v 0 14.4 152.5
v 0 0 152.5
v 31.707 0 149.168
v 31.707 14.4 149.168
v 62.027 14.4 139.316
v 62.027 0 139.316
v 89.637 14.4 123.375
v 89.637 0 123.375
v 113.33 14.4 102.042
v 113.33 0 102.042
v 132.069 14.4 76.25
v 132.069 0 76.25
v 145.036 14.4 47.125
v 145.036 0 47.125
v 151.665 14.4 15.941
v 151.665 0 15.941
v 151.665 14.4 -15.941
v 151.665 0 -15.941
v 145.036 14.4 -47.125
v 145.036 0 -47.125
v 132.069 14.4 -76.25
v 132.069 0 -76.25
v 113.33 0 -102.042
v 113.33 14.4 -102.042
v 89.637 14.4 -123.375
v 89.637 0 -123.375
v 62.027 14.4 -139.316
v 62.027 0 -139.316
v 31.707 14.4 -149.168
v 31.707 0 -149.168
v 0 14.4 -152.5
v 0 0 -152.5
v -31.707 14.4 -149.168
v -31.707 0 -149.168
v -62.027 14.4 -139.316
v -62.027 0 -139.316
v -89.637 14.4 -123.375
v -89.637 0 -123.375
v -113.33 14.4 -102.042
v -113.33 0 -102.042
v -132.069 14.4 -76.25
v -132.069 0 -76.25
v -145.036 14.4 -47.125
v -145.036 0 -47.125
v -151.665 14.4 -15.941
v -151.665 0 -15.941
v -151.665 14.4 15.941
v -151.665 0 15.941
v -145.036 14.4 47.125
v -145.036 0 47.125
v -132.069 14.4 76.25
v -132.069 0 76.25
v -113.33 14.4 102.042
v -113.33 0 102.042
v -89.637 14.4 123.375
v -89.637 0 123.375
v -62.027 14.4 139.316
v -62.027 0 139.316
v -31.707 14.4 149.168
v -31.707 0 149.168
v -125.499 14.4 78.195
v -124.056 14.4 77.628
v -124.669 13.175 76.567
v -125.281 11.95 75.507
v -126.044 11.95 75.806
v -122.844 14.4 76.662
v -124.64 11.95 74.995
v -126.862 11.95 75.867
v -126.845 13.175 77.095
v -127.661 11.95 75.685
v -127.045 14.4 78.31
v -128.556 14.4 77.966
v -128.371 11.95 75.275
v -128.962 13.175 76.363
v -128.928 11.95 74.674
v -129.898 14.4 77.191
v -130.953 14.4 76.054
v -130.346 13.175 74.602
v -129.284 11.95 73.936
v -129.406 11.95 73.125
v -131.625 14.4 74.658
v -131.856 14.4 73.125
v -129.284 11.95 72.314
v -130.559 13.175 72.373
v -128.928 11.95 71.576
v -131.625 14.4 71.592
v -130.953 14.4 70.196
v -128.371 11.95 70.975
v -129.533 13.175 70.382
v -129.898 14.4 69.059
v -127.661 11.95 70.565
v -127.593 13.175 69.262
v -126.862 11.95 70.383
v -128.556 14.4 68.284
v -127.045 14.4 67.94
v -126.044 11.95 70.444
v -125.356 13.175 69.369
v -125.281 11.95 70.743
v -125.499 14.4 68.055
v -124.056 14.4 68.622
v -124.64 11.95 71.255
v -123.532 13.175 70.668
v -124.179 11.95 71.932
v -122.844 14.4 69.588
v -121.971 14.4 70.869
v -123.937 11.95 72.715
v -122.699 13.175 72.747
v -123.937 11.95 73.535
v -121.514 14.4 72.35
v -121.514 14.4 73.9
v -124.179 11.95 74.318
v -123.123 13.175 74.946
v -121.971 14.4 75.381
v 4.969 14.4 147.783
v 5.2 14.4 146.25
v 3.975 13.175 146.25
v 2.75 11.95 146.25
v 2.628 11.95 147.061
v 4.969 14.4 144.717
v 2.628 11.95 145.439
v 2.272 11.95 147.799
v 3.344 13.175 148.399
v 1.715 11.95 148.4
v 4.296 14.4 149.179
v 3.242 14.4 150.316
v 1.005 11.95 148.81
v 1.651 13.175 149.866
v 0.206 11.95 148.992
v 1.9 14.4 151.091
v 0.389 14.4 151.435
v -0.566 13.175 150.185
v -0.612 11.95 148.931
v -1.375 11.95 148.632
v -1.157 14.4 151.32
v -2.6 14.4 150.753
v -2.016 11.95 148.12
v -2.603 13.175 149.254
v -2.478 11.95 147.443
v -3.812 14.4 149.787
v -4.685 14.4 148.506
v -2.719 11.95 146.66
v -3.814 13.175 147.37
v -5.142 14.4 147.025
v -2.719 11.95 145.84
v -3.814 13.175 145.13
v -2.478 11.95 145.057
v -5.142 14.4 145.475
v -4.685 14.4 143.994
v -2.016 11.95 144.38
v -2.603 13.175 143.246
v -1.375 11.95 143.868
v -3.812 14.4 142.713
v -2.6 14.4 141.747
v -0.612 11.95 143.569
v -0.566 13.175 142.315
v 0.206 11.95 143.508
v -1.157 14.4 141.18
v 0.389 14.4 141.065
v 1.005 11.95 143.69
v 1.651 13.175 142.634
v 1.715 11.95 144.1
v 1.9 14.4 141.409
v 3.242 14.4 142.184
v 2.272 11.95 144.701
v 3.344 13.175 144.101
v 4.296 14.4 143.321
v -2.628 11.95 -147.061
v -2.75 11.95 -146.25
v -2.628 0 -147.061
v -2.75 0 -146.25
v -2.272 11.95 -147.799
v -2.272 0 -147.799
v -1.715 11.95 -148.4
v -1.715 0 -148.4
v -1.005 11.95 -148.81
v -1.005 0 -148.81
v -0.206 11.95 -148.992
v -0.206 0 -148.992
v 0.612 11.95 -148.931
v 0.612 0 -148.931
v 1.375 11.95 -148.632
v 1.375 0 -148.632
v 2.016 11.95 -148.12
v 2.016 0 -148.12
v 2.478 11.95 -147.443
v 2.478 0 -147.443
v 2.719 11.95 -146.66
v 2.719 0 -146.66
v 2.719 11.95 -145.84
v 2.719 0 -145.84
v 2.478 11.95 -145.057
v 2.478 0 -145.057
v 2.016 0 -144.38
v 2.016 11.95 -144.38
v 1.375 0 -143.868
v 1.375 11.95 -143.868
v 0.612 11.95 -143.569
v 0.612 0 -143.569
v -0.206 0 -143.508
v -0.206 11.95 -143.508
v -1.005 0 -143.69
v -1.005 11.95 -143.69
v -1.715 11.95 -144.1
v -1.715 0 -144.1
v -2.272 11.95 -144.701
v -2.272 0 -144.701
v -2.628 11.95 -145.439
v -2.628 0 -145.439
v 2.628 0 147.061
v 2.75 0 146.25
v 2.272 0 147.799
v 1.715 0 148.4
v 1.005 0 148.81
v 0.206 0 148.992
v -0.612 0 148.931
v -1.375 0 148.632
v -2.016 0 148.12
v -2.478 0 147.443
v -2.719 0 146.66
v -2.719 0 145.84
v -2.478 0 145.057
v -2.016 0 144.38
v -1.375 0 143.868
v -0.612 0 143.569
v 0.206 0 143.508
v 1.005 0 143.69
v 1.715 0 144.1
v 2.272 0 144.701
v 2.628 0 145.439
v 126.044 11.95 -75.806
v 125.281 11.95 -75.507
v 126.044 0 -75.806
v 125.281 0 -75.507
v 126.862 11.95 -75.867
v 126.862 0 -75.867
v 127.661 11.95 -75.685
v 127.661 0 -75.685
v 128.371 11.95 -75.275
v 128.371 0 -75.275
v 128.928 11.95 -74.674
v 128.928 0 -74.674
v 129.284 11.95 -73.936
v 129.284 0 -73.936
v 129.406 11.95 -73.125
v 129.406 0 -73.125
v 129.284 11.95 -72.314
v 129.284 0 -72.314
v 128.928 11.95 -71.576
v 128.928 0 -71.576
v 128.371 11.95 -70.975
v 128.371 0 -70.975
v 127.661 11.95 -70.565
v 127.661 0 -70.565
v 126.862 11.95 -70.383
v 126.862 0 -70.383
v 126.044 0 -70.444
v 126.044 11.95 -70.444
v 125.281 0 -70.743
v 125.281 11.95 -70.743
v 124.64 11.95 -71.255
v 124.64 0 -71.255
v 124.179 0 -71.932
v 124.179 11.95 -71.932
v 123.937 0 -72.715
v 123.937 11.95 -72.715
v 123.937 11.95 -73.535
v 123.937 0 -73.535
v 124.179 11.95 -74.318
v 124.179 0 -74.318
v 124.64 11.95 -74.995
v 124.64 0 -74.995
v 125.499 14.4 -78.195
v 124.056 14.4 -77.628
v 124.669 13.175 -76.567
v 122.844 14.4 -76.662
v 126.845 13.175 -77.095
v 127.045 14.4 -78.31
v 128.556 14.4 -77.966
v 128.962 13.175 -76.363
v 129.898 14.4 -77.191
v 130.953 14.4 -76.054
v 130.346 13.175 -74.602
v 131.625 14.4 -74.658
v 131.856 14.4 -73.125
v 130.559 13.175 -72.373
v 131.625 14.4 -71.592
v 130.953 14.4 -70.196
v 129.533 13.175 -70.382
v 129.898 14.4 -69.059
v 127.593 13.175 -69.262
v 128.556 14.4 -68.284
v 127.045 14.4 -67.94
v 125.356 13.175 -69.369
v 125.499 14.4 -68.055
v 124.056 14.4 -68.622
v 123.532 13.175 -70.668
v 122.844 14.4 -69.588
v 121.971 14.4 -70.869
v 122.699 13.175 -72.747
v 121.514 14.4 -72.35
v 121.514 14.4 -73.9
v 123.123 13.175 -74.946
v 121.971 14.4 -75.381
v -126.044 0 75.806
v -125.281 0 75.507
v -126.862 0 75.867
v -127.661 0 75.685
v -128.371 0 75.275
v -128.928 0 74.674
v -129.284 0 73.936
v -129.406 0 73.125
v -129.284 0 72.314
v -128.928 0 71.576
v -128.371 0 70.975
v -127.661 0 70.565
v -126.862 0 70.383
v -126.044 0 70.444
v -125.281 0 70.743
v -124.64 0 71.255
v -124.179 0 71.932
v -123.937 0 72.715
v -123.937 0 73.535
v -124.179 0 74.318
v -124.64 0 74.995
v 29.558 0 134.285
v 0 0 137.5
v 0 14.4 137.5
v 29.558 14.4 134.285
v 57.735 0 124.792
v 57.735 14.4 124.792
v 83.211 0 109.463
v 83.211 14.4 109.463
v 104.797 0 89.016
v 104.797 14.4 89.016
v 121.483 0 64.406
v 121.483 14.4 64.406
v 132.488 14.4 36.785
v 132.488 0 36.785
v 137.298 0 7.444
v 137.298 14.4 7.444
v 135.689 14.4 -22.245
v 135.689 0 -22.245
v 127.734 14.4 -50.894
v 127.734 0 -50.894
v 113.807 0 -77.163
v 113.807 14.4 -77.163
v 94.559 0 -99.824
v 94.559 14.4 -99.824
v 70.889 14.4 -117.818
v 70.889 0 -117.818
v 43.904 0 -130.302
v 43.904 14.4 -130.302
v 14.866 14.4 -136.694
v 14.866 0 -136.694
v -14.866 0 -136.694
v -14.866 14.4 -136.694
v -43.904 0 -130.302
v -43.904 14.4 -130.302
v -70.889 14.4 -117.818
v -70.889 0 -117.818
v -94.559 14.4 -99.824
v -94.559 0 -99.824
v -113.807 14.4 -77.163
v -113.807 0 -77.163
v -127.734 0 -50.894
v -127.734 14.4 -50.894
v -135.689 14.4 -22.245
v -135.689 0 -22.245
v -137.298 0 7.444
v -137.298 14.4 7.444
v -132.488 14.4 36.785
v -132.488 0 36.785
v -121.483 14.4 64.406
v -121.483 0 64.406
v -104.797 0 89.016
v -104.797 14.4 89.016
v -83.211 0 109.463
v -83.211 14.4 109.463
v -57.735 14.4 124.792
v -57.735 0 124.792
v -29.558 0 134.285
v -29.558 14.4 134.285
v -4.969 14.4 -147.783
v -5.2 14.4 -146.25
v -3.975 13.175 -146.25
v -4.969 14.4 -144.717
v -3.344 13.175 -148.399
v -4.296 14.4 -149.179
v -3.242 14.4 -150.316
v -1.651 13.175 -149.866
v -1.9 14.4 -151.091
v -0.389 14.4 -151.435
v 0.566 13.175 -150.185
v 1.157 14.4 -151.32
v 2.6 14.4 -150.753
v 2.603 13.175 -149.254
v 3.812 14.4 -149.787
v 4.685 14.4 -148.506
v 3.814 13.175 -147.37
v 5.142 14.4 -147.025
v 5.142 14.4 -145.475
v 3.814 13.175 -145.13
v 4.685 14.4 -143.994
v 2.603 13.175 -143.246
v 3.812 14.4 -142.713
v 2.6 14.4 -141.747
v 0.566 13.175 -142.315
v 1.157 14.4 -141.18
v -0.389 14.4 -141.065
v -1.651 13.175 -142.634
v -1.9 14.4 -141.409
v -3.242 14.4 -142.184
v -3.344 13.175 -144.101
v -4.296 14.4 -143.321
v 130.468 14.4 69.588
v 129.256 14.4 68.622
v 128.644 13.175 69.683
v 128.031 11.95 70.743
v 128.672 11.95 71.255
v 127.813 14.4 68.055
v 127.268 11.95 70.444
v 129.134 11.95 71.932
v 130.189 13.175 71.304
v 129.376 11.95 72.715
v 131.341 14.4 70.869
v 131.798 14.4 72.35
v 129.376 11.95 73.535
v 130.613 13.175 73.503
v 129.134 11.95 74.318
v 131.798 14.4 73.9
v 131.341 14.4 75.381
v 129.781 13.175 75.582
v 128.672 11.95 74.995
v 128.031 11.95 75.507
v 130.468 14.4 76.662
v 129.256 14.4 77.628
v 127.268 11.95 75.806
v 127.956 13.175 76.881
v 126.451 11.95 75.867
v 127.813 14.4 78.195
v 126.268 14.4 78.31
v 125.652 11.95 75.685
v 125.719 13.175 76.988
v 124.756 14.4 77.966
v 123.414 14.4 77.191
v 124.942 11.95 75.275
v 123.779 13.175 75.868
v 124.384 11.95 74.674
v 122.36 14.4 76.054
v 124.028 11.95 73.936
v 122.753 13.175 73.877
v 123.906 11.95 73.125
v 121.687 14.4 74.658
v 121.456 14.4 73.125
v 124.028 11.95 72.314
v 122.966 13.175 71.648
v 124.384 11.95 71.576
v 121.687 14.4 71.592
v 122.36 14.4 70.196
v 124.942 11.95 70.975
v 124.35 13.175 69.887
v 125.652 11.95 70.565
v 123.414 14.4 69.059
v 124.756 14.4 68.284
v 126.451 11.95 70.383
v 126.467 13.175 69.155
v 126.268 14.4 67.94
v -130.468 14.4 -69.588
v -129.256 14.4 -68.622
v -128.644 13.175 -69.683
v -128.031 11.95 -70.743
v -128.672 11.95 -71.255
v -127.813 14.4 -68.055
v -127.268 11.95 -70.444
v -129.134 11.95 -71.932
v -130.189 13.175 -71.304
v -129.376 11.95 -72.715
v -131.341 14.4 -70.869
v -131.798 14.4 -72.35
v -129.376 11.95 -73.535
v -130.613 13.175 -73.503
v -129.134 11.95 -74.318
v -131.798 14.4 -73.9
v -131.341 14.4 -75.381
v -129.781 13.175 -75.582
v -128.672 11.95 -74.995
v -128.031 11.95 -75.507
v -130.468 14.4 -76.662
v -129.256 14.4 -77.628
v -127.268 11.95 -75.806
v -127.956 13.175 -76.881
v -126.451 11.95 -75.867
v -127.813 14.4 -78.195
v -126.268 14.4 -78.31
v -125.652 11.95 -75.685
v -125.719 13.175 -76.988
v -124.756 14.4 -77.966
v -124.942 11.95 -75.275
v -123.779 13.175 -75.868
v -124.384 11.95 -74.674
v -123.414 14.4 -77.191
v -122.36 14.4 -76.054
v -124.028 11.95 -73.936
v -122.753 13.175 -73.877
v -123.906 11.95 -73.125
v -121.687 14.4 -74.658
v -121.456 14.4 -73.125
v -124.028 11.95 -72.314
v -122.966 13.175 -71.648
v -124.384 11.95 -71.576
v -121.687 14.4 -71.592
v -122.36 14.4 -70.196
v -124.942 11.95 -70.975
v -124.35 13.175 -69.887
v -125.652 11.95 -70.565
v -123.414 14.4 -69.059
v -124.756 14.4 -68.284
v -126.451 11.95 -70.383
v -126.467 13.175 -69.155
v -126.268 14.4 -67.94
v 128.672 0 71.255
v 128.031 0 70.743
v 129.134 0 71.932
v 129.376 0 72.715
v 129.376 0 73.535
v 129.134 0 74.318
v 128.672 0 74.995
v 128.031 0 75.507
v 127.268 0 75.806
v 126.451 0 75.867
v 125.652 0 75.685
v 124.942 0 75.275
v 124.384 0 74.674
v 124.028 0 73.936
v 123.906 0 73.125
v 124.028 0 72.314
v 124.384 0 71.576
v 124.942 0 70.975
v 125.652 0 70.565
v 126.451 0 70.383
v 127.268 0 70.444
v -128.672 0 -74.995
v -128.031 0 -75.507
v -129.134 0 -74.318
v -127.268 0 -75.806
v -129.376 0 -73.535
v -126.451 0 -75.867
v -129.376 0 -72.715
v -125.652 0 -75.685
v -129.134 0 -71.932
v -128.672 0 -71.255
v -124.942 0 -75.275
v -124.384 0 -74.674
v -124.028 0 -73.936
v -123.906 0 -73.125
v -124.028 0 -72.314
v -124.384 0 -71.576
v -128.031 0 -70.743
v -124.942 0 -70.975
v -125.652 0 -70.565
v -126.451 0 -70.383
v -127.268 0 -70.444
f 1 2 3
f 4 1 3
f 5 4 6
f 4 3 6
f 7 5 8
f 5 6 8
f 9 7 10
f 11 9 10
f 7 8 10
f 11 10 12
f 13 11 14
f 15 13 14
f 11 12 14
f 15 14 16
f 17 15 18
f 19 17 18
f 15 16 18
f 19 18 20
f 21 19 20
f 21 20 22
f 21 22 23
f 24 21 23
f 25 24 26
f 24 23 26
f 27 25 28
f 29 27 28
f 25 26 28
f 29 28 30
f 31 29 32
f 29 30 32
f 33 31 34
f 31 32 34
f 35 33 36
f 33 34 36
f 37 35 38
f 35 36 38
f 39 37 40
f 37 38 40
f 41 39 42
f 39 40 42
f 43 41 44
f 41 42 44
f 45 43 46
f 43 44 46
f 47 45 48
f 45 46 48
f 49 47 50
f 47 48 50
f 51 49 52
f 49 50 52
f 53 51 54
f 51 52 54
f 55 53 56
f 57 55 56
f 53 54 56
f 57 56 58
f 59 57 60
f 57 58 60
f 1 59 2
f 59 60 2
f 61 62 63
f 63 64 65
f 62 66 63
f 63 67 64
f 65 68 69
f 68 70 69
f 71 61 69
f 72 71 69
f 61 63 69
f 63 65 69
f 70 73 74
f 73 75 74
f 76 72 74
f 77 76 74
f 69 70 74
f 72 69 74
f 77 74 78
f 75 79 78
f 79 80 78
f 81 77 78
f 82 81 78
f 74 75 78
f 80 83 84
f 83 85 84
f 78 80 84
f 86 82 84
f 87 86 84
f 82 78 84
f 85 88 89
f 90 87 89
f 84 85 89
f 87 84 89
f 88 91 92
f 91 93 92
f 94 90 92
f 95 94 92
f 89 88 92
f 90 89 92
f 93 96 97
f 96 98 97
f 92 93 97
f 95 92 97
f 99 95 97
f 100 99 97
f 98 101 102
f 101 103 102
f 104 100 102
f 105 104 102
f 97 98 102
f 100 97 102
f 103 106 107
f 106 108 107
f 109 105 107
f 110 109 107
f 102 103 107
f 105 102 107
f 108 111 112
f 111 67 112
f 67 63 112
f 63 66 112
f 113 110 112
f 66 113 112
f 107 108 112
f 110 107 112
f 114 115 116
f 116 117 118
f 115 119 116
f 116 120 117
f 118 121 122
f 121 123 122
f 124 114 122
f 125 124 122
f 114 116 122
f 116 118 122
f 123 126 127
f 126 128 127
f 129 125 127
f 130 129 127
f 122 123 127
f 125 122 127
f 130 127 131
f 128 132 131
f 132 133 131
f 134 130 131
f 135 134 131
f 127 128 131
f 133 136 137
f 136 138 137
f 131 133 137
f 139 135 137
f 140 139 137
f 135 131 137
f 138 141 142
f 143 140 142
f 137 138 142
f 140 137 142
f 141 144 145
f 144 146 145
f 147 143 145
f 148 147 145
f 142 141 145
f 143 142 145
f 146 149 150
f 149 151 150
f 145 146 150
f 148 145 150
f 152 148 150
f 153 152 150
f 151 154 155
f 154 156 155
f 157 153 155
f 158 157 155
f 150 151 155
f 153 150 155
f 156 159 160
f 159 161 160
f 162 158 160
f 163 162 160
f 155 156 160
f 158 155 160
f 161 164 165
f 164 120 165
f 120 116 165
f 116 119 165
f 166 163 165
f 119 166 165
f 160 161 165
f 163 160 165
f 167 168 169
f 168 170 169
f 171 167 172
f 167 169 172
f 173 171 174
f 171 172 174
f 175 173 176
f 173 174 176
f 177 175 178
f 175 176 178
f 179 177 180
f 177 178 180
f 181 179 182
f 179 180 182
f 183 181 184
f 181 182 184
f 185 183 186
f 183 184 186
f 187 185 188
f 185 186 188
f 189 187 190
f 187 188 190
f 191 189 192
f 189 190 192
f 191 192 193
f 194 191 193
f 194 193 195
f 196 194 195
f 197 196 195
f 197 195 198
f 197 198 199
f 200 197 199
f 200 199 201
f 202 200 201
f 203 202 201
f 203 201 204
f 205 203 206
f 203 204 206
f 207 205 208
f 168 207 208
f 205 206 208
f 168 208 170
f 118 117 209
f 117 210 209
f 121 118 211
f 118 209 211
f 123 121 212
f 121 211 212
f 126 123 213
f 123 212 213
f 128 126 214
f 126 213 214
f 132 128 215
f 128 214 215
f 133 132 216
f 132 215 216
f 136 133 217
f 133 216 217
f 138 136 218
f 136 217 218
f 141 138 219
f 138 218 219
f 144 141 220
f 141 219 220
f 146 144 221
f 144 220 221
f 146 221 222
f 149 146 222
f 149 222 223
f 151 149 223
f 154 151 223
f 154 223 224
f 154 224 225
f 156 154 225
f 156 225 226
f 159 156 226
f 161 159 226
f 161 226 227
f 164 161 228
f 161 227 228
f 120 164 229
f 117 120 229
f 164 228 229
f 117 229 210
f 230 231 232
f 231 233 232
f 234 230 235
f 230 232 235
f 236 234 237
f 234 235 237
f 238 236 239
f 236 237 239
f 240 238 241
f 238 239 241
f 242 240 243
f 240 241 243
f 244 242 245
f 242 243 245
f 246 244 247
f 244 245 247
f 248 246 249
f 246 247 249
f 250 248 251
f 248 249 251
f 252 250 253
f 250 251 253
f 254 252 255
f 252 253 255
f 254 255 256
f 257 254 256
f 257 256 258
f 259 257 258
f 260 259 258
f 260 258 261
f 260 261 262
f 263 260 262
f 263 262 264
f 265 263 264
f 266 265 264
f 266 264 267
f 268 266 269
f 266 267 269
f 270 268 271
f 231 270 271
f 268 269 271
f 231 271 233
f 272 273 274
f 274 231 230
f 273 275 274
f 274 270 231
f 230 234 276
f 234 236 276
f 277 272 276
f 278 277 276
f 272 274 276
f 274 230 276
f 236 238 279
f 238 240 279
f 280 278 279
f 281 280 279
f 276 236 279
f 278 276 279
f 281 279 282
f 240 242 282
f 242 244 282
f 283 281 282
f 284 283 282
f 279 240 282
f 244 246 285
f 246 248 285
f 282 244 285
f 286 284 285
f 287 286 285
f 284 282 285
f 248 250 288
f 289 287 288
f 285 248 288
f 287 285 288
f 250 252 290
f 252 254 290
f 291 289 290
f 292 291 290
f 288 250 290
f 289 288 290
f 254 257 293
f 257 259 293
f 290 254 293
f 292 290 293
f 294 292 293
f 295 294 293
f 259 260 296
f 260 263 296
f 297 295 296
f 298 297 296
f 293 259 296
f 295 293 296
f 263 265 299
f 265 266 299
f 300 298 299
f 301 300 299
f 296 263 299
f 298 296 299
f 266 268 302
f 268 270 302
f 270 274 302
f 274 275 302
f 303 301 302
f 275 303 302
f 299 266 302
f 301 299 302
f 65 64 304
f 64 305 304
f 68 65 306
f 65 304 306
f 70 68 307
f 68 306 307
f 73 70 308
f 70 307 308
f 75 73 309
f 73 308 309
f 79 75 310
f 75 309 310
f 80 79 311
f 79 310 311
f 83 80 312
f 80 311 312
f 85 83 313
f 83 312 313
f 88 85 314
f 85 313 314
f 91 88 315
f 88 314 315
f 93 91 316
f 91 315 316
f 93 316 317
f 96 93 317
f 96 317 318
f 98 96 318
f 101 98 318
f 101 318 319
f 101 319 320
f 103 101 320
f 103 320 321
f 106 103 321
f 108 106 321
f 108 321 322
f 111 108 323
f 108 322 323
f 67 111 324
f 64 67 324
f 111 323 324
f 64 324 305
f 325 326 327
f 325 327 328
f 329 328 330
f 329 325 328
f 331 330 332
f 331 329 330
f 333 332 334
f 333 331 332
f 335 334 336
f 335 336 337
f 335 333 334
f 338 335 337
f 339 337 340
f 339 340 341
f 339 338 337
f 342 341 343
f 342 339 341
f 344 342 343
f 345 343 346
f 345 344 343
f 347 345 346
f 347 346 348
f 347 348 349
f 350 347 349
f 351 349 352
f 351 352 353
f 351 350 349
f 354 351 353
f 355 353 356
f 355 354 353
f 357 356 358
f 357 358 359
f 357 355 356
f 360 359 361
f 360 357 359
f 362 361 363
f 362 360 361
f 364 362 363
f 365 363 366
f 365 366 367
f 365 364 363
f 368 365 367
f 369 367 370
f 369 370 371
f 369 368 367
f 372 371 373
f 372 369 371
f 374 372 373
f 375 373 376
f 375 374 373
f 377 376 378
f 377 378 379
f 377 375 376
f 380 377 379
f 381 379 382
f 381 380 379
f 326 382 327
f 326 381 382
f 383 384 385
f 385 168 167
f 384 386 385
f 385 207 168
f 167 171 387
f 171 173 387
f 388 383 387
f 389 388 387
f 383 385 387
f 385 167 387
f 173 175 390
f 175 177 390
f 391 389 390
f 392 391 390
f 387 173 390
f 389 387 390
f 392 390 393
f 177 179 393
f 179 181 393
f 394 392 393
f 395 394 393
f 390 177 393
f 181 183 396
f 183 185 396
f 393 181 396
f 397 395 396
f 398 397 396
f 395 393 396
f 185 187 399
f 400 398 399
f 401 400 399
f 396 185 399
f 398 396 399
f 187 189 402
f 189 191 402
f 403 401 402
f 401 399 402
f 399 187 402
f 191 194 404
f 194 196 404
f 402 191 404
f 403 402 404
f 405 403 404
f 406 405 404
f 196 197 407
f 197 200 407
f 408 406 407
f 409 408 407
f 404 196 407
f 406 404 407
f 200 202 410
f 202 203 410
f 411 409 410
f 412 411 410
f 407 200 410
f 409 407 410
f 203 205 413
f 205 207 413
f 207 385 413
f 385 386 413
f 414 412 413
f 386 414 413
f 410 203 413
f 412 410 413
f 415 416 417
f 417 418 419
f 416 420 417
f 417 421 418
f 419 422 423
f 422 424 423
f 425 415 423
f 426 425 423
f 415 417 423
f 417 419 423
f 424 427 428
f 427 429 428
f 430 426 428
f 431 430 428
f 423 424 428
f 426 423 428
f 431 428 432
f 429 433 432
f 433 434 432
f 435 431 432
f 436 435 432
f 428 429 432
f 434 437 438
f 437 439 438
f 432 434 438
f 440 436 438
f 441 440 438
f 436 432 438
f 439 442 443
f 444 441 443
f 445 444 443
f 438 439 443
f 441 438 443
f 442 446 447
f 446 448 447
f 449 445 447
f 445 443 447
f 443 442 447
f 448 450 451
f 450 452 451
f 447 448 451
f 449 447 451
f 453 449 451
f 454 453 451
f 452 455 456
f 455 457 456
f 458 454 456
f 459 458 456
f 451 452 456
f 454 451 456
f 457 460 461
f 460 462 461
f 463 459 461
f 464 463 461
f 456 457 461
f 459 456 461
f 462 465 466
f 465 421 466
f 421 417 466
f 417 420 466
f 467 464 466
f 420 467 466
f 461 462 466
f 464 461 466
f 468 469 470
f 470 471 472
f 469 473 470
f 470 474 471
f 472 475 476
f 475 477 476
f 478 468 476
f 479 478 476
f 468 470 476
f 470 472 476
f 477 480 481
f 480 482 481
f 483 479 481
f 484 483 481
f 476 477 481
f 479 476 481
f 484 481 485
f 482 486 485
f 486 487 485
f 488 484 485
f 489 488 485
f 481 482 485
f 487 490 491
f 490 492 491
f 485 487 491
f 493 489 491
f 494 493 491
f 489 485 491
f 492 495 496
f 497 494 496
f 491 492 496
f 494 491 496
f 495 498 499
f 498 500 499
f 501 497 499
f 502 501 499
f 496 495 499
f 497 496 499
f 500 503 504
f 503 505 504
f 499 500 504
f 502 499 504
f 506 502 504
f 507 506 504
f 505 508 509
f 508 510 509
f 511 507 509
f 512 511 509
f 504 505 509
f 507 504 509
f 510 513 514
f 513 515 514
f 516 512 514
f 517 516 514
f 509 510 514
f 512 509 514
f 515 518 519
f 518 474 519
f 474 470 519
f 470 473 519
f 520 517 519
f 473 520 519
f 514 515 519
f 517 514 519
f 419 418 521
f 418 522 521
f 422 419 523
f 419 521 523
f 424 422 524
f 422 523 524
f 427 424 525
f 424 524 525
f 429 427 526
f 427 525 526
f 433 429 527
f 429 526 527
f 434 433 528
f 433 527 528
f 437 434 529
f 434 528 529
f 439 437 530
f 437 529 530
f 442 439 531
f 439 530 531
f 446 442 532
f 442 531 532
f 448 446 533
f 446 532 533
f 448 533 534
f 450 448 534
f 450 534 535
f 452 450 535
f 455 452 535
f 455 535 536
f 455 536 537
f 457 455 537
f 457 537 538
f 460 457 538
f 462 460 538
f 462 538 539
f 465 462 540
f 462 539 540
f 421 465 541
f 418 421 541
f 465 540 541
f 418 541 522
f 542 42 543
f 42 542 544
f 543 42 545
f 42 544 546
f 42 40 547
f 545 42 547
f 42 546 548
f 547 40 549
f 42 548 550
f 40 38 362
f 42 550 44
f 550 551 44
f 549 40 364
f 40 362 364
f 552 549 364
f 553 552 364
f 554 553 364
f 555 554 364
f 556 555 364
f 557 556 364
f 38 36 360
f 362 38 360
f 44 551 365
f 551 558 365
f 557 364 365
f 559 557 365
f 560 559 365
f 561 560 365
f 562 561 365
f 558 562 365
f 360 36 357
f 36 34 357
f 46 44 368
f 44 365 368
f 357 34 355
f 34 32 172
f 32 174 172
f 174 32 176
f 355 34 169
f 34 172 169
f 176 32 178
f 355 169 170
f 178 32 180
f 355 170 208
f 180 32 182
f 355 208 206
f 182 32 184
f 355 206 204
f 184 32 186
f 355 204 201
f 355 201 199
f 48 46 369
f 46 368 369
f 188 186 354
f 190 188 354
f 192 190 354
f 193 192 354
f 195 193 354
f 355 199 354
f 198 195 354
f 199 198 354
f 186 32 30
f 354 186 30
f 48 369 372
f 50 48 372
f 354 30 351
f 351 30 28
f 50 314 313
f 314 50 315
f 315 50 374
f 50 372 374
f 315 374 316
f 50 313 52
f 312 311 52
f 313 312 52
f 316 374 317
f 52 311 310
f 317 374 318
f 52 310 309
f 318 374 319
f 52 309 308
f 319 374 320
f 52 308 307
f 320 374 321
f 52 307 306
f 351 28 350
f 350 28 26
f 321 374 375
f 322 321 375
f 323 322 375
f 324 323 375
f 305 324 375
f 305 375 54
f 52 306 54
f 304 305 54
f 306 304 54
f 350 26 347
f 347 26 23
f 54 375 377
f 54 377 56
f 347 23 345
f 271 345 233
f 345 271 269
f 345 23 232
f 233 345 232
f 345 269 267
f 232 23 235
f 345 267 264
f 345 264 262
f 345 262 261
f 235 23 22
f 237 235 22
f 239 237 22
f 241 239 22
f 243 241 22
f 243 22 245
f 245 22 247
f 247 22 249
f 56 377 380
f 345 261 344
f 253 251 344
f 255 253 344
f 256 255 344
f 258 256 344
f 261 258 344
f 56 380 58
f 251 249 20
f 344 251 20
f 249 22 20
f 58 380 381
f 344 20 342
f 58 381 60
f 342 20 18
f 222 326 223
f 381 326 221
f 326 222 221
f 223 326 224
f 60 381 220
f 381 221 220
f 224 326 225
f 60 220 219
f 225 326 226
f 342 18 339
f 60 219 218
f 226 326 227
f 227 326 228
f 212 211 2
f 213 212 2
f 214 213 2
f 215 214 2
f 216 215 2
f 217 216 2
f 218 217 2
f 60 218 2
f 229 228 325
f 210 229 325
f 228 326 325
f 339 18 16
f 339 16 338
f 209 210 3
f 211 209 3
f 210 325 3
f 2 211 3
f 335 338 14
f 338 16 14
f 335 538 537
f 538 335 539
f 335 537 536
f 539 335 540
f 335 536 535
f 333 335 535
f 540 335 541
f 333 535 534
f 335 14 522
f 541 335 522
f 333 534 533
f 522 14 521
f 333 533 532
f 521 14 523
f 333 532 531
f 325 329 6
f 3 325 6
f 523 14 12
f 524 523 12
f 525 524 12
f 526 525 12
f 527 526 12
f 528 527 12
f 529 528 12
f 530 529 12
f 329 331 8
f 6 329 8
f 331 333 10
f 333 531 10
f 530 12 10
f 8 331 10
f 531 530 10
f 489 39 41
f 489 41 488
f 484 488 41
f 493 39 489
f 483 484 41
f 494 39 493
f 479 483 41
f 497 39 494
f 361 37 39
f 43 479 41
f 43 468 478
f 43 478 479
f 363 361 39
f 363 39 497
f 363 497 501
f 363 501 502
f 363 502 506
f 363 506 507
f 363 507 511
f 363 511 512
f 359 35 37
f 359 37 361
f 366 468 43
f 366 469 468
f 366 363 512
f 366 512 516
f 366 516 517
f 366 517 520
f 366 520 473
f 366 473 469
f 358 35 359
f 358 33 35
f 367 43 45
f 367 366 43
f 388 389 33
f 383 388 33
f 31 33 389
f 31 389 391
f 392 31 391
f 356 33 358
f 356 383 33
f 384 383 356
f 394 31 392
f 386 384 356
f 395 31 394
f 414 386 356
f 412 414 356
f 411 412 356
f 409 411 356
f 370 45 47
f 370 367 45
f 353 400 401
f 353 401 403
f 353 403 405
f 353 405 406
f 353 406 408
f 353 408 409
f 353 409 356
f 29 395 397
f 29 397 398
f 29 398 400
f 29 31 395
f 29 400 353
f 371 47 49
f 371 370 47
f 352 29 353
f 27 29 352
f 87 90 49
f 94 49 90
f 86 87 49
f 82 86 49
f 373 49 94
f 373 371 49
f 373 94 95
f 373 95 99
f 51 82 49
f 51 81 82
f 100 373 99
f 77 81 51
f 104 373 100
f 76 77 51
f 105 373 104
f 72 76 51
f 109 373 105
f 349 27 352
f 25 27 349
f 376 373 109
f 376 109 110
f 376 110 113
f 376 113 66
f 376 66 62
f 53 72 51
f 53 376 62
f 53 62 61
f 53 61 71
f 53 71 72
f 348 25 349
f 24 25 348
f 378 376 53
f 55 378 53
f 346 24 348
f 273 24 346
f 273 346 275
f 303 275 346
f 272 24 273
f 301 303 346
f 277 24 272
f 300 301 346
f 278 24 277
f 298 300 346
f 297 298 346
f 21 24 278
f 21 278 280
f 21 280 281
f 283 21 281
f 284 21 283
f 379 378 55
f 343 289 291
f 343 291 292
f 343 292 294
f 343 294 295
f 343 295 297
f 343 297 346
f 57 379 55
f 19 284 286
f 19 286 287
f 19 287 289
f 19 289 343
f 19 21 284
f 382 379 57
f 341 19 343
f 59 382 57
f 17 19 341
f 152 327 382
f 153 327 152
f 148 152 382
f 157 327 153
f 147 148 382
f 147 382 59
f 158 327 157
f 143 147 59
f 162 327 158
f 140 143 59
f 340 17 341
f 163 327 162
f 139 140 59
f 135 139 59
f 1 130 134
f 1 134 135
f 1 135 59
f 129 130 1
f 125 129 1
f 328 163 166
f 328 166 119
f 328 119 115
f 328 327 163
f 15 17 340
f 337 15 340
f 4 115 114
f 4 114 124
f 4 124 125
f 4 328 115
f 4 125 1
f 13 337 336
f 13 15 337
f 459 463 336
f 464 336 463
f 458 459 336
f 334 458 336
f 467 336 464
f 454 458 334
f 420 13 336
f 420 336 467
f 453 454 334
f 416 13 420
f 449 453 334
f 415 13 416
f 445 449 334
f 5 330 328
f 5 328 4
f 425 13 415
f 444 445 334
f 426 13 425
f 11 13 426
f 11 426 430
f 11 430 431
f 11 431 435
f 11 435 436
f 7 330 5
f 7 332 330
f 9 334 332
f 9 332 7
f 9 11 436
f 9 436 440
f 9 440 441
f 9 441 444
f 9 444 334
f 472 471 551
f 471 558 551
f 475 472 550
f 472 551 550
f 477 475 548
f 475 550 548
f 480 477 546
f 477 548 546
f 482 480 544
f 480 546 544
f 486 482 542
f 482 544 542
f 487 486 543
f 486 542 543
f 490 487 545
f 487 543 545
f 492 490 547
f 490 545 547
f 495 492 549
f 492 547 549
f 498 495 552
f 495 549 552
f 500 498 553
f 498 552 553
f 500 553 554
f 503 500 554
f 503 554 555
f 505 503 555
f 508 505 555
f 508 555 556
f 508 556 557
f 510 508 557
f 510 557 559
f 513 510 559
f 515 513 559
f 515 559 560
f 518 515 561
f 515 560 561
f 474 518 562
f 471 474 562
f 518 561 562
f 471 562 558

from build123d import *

# Parameters (mm, degrees)
SKETCH1_R                                       = 152.5
SKETCH1_R_2                                     = 137.5
BOSS_EXTRUDE1_DEPTH                             = 14.4
CSK_FOR_M5_FLAT_HEAD_MACHINE_SCREW1_D           = 5.5
CSK_FOR_M5_FLAT_HEAD_MACHINE_SCREW1_CSINK_D     = 10.4
CSK_FOR_M5_FLAT_HEAD_MACHINE_SCREW1_CSINK_ANGLE = 90
CIRPATTERN1_COUNT                               = 6


with BuildPart() as part:
    # Sketch1 → Boss-Extrude1 (new body)
    with BuildSketch(Plane(origin=(0, 0, 0), x_dir=(1, 0, 0), z_dir=(0, 1, 0))):
        with Locations(Location((0, 0, 0), (0, 0, 270))):
            Circle(SKETCH1_R)
        with Locations(Location((0, 0, 0), (0, 0, 270))):
            Circle(SKETCH1_R_2, mode=Mode.SUBTRACT)
    extrude(amount=BOSS_EXTRUDE1_DEPTH)

    # CSK for M5 Flat Head Machine Screw1 (through all)
    with Locations(Plane(origin=(0, 14.4, 0), x_dir=(1, 0, 0), z_dir=(0, 1, 0))):
        with Locations((0, 146.25)):
            csk_for_m5_flat_head_machine_screw1 = CounterSinkHole(CSK_FOR_M5_FLAT_HEAD_MACHINE_SCREW1_D / 2, CSK_FOR_M5_FLAT_HEAD_MACHINE_SCREW1_CSINK_D / 2, counter_sink_angle=CSK_FOR_M5_FLAT_HEAD_MACHINE_SCREW1_CSINK_ANGLE)

    # CirPattern1: CSK for M5 Flat Head Machine Screw1 ×6 about axis
    cirpattern1_axis = Axis((0, 0, 0), (0, 1, 0))
    for i in range(1, CIRPATTERN1_COUNT):
        add(csk_for_m5_flat_head_machine_screw1.rotate(cirpattern1_axis, i * 360 / CIRPATTERN1_COUNT), mode=Mode.SUBTRACT)


solid = part.part
